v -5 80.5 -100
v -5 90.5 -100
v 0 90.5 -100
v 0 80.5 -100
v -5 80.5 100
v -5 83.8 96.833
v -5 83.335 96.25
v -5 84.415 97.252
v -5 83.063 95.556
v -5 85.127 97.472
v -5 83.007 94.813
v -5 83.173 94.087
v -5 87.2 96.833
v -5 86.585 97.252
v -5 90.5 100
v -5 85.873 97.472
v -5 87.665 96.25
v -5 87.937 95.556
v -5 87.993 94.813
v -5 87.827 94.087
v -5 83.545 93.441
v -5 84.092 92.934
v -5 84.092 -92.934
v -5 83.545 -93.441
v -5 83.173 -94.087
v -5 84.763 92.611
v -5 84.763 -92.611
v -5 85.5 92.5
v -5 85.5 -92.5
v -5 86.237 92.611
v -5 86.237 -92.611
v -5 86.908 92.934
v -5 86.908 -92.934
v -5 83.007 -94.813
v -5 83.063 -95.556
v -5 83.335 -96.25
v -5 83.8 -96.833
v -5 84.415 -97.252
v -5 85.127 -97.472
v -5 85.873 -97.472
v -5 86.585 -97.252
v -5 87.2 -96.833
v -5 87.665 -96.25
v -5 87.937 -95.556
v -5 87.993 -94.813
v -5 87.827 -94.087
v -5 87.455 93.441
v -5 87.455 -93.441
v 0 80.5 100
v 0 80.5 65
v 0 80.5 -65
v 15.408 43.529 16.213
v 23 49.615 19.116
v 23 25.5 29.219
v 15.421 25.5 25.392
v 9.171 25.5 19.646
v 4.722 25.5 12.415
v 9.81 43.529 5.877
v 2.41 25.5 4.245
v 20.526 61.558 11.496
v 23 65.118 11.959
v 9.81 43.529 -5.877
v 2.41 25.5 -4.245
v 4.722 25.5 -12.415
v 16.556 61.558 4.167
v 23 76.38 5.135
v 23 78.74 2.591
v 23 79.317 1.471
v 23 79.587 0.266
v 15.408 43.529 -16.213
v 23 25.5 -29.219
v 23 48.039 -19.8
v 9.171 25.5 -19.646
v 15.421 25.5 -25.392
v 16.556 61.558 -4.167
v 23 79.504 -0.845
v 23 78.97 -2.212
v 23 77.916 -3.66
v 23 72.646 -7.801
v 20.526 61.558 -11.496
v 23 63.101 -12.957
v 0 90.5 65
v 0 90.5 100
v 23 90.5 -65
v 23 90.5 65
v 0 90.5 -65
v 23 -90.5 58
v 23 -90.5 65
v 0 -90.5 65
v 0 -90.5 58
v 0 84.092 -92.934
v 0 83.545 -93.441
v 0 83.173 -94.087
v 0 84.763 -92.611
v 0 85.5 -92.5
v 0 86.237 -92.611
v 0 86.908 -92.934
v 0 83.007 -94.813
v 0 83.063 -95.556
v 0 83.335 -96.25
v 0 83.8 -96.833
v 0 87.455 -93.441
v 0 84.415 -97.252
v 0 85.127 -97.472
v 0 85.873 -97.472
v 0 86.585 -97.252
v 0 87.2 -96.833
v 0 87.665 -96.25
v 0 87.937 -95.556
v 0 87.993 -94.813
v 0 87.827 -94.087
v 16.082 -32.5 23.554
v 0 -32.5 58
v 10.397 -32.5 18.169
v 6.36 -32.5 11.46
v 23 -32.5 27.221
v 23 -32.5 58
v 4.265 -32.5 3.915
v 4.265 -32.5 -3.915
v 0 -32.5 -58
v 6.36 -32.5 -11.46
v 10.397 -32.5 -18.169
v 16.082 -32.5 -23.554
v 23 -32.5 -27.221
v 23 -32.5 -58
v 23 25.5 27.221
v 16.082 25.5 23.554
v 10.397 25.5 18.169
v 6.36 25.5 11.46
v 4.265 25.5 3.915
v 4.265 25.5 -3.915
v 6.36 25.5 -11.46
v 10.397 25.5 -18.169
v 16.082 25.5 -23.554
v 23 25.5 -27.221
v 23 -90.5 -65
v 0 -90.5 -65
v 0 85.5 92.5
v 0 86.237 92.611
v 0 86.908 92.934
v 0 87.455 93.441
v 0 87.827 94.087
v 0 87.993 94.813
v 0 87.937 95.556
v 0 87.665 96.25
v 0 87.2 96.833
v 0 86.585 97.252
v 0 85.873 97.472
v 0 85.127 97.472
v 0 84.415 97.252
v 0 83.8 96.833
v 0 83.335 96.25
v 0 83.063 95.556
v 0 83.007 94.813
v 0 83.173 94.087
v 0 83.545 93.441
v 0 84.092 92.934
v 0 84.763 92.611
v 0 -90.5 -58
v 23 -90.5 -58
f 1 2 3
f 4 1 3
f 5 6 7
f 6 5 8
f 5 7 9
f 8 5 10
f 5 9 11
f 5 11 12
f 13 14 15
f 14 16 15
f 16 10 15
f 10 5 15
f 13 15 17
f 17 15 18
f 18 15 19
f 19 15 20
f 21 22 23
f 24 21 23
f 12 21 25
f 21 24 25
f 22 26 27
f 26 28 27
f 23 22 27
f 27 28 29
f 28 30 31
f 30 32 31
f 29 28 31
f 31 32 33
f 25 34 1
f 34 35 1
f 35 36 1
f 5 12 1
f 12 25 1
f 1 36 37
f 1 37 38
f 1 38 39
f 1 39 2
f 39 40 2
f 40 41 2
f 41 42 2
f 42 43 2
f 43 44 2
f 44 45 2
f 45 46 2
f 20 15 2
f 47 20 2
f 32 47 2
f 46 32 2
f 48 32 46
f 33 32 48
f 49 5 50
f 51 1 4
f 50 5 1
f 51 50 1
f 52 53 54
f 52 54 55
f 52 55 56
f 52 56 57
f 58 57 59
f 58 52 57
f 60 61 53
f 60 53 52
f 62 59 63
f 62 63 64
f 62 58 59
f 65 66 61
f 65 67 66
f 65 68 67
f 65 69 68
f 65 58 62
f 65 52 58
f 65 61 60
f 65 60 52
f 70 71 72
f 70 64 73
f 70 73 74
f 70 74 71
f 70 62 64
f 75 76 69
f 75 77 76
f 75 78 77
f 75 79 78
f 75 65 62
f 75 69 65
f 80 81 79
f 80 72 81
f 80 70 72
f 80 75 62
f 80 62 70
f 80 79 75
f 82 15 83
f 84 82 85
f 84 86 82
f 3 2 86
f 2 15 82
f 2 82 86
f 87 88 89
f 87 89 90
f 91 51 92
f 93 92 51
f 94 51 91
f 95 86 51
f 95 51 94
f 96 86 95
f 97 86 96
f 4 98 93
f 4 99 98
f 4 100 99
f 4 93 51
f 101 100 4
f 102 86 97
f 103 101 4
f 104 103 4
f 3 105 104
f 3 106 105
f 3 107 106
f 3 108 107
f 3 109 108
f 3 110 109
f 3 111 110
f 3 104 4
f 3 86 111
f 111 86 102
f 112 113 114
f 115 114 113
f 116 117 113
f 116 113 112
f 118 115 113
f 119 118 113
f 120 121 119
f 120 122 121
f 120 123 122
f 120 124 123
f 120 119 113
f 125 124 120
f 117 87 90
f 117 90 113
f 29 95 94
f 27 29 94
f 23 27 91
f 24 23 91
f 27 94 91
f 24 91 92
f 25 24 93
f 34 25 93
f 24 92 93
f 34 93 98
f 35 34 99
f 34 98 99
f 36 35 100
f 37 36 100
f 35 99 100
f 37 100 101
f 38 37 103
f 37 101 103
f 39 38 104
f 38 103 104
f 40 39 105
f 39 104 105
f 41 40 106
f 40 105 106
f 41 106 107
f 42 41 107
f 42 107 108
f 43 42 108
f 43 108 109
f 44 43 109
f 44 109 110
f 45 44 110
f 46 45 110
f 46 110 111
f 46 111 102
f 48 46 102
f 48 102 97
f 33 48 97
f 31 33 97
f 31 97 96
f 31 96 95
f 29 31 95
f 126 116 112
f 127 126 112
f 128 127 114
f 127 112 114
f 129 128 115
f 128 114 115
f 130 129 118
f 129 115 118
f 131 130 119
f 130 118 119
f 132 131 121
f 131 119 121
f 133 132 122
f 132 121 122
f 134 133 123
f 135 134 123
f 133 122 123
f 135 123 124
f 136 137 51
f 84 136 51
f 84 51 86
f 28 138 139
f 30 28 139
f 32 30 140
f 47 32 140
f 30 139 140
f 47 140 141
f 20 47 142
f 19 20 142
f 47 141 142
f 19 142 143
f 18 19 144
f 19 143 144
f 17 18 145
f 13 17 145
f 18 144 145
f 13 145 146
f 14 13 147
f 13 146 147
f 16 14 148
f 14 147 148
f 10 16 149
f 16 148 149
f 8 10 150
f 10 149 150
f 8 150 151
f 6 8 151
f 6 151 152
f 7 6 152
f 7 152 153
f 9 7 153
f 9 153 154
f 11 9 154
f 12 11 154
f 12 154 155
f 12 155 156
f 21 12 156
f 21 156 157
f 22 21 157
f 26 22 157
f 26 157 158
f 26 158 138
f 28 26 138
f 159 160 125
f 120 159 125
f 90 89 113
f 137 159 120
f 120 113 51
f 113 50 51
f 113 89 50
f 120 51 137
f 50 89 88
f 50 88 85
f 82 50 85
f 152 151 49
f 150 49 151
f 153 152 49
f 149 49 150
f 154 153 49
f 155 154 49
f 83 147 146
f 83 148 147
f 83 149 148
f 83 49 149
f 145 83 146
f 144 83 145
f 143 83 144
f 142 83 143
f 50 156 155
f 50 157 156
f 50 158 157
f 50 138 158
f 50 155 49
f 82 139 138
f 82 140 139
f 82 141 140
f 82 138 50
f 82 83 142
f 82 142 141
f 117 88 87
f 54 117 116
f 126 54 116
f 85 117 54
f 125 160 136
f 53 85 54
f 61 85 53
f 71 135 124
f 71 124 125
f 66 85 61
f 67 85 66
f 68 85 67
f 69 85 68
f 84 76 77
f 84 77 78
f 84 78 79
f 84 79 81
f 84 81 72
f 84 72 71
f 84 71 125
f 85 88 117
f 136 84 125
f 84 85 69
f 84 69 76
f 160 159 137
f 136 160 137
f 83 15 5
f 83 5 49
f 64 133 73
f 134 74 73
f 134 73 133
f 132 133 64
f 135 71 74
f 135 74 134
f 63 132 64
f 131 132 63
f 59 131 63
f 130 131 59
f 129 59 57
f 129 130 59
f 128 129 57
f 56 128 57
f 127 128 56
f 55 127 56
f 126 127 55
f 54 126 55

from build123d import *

# Parameters (mm, degrees)
ESQUISSE1_W             = 130
ESQUISSE1_H             = 181
BASE_DEPTH              = 23
ESQUISSE2_W             = 116
ESQUISSE2_H             = 58
VIDE_CUBE_DEPTH         = 114.772799913
ESQUISSE3_R             = 29
VIDE_CYLINDRE_DEPTH     = 58
ESQUISSE5_W             = 5
ESQUISSE5_H             = 200
FIXATION_TIGE_DEPTH     = 10
ESQUISSE6_R             = 2.5
ENL_V_MAT_EXTRU_1_DEPTH = 137.818310178


with BuildPart() as part:
    # Esquisse1 → BASE (new body)
    with BuildSketch(Plane(origin=(0, 0, 0), x_dir=(0, 0, -1), z_dir=(1, 0, 0))):
        Rectangle(ESQUISSE1_W, ESQUISSE1_H)
    extrude(amount=BASE_DEPTH)

    # Esquisse2 → VIDE CUBE (cut, through all)
    with BuildSketch(Plane(origin=(23, 0, 0), x_dir=(0, 0, -1), z_dir=(1, 0, 0))):
        with Locations((0, -61.5)):
            Rectangle(ESQUISSE2_W, ESQUISSE2_H)
    extrude(amount=-VIDE_CUBE_DEPTH, mode=Mode.SUBTRACT)

    # Esquisse3 → VIDE CYLINDRE (cut)
    with BuildSketch(Plane.XZ.offset(32.5)):
        with Locations((33, 0)):
            Circle(ESQUISSE3_R)
    extrude(amount=-VIDE_CYLINDRE_DEPTH, mode=Mode.SUBTRACT)

    # Esquisse4 → VIDE CONE (revolve, cut)
    with BuildSketch(Plane(origin=(33, 0, 0), x_dir=(0, 0, -1), z_dir=(1, 0, 0))):
        Polygon((0, 25.5), (30.88316048, 25.5), (0, 105.5), align=None)
    revolve(axis=Axis((33, 105.5, 0), (0, -1, 0)), mode=Mode.SUBTRACT)

    # Esquisse5 → FIXATION TIGE (add)
    with BuildSketch(Plane(origin=(0, 90.5, 0), x_dir=(1, 0, 0), z_dir=(0, 1, 0))):
        with Locations((-2.5, 0)):
            Rectangle(ESQUISSE5_W, ESQUISSE5_H)
    extrude(amount=-FIXATION_TIGE_DEPTH)

    # Esquisse6 → Enlèv. mat.-Extru.1 (cut, through all)
    with BuildSketch(Plane(origin=(0, 0, 0), x_dir=(0, 0, -1), z_dir=(1, 0, 0))):
        with Locations((-95, 85.5)):
            Circle(ESQUISSE6_R)
        with Locations((95, 85.5)):
            Circle(ESQUISSE6_R)
    extrude(amount=-ENL_V_MAT_EXTRU_1_DEPTH, mode=Mode.SUBTRACT)


solid = part.part
